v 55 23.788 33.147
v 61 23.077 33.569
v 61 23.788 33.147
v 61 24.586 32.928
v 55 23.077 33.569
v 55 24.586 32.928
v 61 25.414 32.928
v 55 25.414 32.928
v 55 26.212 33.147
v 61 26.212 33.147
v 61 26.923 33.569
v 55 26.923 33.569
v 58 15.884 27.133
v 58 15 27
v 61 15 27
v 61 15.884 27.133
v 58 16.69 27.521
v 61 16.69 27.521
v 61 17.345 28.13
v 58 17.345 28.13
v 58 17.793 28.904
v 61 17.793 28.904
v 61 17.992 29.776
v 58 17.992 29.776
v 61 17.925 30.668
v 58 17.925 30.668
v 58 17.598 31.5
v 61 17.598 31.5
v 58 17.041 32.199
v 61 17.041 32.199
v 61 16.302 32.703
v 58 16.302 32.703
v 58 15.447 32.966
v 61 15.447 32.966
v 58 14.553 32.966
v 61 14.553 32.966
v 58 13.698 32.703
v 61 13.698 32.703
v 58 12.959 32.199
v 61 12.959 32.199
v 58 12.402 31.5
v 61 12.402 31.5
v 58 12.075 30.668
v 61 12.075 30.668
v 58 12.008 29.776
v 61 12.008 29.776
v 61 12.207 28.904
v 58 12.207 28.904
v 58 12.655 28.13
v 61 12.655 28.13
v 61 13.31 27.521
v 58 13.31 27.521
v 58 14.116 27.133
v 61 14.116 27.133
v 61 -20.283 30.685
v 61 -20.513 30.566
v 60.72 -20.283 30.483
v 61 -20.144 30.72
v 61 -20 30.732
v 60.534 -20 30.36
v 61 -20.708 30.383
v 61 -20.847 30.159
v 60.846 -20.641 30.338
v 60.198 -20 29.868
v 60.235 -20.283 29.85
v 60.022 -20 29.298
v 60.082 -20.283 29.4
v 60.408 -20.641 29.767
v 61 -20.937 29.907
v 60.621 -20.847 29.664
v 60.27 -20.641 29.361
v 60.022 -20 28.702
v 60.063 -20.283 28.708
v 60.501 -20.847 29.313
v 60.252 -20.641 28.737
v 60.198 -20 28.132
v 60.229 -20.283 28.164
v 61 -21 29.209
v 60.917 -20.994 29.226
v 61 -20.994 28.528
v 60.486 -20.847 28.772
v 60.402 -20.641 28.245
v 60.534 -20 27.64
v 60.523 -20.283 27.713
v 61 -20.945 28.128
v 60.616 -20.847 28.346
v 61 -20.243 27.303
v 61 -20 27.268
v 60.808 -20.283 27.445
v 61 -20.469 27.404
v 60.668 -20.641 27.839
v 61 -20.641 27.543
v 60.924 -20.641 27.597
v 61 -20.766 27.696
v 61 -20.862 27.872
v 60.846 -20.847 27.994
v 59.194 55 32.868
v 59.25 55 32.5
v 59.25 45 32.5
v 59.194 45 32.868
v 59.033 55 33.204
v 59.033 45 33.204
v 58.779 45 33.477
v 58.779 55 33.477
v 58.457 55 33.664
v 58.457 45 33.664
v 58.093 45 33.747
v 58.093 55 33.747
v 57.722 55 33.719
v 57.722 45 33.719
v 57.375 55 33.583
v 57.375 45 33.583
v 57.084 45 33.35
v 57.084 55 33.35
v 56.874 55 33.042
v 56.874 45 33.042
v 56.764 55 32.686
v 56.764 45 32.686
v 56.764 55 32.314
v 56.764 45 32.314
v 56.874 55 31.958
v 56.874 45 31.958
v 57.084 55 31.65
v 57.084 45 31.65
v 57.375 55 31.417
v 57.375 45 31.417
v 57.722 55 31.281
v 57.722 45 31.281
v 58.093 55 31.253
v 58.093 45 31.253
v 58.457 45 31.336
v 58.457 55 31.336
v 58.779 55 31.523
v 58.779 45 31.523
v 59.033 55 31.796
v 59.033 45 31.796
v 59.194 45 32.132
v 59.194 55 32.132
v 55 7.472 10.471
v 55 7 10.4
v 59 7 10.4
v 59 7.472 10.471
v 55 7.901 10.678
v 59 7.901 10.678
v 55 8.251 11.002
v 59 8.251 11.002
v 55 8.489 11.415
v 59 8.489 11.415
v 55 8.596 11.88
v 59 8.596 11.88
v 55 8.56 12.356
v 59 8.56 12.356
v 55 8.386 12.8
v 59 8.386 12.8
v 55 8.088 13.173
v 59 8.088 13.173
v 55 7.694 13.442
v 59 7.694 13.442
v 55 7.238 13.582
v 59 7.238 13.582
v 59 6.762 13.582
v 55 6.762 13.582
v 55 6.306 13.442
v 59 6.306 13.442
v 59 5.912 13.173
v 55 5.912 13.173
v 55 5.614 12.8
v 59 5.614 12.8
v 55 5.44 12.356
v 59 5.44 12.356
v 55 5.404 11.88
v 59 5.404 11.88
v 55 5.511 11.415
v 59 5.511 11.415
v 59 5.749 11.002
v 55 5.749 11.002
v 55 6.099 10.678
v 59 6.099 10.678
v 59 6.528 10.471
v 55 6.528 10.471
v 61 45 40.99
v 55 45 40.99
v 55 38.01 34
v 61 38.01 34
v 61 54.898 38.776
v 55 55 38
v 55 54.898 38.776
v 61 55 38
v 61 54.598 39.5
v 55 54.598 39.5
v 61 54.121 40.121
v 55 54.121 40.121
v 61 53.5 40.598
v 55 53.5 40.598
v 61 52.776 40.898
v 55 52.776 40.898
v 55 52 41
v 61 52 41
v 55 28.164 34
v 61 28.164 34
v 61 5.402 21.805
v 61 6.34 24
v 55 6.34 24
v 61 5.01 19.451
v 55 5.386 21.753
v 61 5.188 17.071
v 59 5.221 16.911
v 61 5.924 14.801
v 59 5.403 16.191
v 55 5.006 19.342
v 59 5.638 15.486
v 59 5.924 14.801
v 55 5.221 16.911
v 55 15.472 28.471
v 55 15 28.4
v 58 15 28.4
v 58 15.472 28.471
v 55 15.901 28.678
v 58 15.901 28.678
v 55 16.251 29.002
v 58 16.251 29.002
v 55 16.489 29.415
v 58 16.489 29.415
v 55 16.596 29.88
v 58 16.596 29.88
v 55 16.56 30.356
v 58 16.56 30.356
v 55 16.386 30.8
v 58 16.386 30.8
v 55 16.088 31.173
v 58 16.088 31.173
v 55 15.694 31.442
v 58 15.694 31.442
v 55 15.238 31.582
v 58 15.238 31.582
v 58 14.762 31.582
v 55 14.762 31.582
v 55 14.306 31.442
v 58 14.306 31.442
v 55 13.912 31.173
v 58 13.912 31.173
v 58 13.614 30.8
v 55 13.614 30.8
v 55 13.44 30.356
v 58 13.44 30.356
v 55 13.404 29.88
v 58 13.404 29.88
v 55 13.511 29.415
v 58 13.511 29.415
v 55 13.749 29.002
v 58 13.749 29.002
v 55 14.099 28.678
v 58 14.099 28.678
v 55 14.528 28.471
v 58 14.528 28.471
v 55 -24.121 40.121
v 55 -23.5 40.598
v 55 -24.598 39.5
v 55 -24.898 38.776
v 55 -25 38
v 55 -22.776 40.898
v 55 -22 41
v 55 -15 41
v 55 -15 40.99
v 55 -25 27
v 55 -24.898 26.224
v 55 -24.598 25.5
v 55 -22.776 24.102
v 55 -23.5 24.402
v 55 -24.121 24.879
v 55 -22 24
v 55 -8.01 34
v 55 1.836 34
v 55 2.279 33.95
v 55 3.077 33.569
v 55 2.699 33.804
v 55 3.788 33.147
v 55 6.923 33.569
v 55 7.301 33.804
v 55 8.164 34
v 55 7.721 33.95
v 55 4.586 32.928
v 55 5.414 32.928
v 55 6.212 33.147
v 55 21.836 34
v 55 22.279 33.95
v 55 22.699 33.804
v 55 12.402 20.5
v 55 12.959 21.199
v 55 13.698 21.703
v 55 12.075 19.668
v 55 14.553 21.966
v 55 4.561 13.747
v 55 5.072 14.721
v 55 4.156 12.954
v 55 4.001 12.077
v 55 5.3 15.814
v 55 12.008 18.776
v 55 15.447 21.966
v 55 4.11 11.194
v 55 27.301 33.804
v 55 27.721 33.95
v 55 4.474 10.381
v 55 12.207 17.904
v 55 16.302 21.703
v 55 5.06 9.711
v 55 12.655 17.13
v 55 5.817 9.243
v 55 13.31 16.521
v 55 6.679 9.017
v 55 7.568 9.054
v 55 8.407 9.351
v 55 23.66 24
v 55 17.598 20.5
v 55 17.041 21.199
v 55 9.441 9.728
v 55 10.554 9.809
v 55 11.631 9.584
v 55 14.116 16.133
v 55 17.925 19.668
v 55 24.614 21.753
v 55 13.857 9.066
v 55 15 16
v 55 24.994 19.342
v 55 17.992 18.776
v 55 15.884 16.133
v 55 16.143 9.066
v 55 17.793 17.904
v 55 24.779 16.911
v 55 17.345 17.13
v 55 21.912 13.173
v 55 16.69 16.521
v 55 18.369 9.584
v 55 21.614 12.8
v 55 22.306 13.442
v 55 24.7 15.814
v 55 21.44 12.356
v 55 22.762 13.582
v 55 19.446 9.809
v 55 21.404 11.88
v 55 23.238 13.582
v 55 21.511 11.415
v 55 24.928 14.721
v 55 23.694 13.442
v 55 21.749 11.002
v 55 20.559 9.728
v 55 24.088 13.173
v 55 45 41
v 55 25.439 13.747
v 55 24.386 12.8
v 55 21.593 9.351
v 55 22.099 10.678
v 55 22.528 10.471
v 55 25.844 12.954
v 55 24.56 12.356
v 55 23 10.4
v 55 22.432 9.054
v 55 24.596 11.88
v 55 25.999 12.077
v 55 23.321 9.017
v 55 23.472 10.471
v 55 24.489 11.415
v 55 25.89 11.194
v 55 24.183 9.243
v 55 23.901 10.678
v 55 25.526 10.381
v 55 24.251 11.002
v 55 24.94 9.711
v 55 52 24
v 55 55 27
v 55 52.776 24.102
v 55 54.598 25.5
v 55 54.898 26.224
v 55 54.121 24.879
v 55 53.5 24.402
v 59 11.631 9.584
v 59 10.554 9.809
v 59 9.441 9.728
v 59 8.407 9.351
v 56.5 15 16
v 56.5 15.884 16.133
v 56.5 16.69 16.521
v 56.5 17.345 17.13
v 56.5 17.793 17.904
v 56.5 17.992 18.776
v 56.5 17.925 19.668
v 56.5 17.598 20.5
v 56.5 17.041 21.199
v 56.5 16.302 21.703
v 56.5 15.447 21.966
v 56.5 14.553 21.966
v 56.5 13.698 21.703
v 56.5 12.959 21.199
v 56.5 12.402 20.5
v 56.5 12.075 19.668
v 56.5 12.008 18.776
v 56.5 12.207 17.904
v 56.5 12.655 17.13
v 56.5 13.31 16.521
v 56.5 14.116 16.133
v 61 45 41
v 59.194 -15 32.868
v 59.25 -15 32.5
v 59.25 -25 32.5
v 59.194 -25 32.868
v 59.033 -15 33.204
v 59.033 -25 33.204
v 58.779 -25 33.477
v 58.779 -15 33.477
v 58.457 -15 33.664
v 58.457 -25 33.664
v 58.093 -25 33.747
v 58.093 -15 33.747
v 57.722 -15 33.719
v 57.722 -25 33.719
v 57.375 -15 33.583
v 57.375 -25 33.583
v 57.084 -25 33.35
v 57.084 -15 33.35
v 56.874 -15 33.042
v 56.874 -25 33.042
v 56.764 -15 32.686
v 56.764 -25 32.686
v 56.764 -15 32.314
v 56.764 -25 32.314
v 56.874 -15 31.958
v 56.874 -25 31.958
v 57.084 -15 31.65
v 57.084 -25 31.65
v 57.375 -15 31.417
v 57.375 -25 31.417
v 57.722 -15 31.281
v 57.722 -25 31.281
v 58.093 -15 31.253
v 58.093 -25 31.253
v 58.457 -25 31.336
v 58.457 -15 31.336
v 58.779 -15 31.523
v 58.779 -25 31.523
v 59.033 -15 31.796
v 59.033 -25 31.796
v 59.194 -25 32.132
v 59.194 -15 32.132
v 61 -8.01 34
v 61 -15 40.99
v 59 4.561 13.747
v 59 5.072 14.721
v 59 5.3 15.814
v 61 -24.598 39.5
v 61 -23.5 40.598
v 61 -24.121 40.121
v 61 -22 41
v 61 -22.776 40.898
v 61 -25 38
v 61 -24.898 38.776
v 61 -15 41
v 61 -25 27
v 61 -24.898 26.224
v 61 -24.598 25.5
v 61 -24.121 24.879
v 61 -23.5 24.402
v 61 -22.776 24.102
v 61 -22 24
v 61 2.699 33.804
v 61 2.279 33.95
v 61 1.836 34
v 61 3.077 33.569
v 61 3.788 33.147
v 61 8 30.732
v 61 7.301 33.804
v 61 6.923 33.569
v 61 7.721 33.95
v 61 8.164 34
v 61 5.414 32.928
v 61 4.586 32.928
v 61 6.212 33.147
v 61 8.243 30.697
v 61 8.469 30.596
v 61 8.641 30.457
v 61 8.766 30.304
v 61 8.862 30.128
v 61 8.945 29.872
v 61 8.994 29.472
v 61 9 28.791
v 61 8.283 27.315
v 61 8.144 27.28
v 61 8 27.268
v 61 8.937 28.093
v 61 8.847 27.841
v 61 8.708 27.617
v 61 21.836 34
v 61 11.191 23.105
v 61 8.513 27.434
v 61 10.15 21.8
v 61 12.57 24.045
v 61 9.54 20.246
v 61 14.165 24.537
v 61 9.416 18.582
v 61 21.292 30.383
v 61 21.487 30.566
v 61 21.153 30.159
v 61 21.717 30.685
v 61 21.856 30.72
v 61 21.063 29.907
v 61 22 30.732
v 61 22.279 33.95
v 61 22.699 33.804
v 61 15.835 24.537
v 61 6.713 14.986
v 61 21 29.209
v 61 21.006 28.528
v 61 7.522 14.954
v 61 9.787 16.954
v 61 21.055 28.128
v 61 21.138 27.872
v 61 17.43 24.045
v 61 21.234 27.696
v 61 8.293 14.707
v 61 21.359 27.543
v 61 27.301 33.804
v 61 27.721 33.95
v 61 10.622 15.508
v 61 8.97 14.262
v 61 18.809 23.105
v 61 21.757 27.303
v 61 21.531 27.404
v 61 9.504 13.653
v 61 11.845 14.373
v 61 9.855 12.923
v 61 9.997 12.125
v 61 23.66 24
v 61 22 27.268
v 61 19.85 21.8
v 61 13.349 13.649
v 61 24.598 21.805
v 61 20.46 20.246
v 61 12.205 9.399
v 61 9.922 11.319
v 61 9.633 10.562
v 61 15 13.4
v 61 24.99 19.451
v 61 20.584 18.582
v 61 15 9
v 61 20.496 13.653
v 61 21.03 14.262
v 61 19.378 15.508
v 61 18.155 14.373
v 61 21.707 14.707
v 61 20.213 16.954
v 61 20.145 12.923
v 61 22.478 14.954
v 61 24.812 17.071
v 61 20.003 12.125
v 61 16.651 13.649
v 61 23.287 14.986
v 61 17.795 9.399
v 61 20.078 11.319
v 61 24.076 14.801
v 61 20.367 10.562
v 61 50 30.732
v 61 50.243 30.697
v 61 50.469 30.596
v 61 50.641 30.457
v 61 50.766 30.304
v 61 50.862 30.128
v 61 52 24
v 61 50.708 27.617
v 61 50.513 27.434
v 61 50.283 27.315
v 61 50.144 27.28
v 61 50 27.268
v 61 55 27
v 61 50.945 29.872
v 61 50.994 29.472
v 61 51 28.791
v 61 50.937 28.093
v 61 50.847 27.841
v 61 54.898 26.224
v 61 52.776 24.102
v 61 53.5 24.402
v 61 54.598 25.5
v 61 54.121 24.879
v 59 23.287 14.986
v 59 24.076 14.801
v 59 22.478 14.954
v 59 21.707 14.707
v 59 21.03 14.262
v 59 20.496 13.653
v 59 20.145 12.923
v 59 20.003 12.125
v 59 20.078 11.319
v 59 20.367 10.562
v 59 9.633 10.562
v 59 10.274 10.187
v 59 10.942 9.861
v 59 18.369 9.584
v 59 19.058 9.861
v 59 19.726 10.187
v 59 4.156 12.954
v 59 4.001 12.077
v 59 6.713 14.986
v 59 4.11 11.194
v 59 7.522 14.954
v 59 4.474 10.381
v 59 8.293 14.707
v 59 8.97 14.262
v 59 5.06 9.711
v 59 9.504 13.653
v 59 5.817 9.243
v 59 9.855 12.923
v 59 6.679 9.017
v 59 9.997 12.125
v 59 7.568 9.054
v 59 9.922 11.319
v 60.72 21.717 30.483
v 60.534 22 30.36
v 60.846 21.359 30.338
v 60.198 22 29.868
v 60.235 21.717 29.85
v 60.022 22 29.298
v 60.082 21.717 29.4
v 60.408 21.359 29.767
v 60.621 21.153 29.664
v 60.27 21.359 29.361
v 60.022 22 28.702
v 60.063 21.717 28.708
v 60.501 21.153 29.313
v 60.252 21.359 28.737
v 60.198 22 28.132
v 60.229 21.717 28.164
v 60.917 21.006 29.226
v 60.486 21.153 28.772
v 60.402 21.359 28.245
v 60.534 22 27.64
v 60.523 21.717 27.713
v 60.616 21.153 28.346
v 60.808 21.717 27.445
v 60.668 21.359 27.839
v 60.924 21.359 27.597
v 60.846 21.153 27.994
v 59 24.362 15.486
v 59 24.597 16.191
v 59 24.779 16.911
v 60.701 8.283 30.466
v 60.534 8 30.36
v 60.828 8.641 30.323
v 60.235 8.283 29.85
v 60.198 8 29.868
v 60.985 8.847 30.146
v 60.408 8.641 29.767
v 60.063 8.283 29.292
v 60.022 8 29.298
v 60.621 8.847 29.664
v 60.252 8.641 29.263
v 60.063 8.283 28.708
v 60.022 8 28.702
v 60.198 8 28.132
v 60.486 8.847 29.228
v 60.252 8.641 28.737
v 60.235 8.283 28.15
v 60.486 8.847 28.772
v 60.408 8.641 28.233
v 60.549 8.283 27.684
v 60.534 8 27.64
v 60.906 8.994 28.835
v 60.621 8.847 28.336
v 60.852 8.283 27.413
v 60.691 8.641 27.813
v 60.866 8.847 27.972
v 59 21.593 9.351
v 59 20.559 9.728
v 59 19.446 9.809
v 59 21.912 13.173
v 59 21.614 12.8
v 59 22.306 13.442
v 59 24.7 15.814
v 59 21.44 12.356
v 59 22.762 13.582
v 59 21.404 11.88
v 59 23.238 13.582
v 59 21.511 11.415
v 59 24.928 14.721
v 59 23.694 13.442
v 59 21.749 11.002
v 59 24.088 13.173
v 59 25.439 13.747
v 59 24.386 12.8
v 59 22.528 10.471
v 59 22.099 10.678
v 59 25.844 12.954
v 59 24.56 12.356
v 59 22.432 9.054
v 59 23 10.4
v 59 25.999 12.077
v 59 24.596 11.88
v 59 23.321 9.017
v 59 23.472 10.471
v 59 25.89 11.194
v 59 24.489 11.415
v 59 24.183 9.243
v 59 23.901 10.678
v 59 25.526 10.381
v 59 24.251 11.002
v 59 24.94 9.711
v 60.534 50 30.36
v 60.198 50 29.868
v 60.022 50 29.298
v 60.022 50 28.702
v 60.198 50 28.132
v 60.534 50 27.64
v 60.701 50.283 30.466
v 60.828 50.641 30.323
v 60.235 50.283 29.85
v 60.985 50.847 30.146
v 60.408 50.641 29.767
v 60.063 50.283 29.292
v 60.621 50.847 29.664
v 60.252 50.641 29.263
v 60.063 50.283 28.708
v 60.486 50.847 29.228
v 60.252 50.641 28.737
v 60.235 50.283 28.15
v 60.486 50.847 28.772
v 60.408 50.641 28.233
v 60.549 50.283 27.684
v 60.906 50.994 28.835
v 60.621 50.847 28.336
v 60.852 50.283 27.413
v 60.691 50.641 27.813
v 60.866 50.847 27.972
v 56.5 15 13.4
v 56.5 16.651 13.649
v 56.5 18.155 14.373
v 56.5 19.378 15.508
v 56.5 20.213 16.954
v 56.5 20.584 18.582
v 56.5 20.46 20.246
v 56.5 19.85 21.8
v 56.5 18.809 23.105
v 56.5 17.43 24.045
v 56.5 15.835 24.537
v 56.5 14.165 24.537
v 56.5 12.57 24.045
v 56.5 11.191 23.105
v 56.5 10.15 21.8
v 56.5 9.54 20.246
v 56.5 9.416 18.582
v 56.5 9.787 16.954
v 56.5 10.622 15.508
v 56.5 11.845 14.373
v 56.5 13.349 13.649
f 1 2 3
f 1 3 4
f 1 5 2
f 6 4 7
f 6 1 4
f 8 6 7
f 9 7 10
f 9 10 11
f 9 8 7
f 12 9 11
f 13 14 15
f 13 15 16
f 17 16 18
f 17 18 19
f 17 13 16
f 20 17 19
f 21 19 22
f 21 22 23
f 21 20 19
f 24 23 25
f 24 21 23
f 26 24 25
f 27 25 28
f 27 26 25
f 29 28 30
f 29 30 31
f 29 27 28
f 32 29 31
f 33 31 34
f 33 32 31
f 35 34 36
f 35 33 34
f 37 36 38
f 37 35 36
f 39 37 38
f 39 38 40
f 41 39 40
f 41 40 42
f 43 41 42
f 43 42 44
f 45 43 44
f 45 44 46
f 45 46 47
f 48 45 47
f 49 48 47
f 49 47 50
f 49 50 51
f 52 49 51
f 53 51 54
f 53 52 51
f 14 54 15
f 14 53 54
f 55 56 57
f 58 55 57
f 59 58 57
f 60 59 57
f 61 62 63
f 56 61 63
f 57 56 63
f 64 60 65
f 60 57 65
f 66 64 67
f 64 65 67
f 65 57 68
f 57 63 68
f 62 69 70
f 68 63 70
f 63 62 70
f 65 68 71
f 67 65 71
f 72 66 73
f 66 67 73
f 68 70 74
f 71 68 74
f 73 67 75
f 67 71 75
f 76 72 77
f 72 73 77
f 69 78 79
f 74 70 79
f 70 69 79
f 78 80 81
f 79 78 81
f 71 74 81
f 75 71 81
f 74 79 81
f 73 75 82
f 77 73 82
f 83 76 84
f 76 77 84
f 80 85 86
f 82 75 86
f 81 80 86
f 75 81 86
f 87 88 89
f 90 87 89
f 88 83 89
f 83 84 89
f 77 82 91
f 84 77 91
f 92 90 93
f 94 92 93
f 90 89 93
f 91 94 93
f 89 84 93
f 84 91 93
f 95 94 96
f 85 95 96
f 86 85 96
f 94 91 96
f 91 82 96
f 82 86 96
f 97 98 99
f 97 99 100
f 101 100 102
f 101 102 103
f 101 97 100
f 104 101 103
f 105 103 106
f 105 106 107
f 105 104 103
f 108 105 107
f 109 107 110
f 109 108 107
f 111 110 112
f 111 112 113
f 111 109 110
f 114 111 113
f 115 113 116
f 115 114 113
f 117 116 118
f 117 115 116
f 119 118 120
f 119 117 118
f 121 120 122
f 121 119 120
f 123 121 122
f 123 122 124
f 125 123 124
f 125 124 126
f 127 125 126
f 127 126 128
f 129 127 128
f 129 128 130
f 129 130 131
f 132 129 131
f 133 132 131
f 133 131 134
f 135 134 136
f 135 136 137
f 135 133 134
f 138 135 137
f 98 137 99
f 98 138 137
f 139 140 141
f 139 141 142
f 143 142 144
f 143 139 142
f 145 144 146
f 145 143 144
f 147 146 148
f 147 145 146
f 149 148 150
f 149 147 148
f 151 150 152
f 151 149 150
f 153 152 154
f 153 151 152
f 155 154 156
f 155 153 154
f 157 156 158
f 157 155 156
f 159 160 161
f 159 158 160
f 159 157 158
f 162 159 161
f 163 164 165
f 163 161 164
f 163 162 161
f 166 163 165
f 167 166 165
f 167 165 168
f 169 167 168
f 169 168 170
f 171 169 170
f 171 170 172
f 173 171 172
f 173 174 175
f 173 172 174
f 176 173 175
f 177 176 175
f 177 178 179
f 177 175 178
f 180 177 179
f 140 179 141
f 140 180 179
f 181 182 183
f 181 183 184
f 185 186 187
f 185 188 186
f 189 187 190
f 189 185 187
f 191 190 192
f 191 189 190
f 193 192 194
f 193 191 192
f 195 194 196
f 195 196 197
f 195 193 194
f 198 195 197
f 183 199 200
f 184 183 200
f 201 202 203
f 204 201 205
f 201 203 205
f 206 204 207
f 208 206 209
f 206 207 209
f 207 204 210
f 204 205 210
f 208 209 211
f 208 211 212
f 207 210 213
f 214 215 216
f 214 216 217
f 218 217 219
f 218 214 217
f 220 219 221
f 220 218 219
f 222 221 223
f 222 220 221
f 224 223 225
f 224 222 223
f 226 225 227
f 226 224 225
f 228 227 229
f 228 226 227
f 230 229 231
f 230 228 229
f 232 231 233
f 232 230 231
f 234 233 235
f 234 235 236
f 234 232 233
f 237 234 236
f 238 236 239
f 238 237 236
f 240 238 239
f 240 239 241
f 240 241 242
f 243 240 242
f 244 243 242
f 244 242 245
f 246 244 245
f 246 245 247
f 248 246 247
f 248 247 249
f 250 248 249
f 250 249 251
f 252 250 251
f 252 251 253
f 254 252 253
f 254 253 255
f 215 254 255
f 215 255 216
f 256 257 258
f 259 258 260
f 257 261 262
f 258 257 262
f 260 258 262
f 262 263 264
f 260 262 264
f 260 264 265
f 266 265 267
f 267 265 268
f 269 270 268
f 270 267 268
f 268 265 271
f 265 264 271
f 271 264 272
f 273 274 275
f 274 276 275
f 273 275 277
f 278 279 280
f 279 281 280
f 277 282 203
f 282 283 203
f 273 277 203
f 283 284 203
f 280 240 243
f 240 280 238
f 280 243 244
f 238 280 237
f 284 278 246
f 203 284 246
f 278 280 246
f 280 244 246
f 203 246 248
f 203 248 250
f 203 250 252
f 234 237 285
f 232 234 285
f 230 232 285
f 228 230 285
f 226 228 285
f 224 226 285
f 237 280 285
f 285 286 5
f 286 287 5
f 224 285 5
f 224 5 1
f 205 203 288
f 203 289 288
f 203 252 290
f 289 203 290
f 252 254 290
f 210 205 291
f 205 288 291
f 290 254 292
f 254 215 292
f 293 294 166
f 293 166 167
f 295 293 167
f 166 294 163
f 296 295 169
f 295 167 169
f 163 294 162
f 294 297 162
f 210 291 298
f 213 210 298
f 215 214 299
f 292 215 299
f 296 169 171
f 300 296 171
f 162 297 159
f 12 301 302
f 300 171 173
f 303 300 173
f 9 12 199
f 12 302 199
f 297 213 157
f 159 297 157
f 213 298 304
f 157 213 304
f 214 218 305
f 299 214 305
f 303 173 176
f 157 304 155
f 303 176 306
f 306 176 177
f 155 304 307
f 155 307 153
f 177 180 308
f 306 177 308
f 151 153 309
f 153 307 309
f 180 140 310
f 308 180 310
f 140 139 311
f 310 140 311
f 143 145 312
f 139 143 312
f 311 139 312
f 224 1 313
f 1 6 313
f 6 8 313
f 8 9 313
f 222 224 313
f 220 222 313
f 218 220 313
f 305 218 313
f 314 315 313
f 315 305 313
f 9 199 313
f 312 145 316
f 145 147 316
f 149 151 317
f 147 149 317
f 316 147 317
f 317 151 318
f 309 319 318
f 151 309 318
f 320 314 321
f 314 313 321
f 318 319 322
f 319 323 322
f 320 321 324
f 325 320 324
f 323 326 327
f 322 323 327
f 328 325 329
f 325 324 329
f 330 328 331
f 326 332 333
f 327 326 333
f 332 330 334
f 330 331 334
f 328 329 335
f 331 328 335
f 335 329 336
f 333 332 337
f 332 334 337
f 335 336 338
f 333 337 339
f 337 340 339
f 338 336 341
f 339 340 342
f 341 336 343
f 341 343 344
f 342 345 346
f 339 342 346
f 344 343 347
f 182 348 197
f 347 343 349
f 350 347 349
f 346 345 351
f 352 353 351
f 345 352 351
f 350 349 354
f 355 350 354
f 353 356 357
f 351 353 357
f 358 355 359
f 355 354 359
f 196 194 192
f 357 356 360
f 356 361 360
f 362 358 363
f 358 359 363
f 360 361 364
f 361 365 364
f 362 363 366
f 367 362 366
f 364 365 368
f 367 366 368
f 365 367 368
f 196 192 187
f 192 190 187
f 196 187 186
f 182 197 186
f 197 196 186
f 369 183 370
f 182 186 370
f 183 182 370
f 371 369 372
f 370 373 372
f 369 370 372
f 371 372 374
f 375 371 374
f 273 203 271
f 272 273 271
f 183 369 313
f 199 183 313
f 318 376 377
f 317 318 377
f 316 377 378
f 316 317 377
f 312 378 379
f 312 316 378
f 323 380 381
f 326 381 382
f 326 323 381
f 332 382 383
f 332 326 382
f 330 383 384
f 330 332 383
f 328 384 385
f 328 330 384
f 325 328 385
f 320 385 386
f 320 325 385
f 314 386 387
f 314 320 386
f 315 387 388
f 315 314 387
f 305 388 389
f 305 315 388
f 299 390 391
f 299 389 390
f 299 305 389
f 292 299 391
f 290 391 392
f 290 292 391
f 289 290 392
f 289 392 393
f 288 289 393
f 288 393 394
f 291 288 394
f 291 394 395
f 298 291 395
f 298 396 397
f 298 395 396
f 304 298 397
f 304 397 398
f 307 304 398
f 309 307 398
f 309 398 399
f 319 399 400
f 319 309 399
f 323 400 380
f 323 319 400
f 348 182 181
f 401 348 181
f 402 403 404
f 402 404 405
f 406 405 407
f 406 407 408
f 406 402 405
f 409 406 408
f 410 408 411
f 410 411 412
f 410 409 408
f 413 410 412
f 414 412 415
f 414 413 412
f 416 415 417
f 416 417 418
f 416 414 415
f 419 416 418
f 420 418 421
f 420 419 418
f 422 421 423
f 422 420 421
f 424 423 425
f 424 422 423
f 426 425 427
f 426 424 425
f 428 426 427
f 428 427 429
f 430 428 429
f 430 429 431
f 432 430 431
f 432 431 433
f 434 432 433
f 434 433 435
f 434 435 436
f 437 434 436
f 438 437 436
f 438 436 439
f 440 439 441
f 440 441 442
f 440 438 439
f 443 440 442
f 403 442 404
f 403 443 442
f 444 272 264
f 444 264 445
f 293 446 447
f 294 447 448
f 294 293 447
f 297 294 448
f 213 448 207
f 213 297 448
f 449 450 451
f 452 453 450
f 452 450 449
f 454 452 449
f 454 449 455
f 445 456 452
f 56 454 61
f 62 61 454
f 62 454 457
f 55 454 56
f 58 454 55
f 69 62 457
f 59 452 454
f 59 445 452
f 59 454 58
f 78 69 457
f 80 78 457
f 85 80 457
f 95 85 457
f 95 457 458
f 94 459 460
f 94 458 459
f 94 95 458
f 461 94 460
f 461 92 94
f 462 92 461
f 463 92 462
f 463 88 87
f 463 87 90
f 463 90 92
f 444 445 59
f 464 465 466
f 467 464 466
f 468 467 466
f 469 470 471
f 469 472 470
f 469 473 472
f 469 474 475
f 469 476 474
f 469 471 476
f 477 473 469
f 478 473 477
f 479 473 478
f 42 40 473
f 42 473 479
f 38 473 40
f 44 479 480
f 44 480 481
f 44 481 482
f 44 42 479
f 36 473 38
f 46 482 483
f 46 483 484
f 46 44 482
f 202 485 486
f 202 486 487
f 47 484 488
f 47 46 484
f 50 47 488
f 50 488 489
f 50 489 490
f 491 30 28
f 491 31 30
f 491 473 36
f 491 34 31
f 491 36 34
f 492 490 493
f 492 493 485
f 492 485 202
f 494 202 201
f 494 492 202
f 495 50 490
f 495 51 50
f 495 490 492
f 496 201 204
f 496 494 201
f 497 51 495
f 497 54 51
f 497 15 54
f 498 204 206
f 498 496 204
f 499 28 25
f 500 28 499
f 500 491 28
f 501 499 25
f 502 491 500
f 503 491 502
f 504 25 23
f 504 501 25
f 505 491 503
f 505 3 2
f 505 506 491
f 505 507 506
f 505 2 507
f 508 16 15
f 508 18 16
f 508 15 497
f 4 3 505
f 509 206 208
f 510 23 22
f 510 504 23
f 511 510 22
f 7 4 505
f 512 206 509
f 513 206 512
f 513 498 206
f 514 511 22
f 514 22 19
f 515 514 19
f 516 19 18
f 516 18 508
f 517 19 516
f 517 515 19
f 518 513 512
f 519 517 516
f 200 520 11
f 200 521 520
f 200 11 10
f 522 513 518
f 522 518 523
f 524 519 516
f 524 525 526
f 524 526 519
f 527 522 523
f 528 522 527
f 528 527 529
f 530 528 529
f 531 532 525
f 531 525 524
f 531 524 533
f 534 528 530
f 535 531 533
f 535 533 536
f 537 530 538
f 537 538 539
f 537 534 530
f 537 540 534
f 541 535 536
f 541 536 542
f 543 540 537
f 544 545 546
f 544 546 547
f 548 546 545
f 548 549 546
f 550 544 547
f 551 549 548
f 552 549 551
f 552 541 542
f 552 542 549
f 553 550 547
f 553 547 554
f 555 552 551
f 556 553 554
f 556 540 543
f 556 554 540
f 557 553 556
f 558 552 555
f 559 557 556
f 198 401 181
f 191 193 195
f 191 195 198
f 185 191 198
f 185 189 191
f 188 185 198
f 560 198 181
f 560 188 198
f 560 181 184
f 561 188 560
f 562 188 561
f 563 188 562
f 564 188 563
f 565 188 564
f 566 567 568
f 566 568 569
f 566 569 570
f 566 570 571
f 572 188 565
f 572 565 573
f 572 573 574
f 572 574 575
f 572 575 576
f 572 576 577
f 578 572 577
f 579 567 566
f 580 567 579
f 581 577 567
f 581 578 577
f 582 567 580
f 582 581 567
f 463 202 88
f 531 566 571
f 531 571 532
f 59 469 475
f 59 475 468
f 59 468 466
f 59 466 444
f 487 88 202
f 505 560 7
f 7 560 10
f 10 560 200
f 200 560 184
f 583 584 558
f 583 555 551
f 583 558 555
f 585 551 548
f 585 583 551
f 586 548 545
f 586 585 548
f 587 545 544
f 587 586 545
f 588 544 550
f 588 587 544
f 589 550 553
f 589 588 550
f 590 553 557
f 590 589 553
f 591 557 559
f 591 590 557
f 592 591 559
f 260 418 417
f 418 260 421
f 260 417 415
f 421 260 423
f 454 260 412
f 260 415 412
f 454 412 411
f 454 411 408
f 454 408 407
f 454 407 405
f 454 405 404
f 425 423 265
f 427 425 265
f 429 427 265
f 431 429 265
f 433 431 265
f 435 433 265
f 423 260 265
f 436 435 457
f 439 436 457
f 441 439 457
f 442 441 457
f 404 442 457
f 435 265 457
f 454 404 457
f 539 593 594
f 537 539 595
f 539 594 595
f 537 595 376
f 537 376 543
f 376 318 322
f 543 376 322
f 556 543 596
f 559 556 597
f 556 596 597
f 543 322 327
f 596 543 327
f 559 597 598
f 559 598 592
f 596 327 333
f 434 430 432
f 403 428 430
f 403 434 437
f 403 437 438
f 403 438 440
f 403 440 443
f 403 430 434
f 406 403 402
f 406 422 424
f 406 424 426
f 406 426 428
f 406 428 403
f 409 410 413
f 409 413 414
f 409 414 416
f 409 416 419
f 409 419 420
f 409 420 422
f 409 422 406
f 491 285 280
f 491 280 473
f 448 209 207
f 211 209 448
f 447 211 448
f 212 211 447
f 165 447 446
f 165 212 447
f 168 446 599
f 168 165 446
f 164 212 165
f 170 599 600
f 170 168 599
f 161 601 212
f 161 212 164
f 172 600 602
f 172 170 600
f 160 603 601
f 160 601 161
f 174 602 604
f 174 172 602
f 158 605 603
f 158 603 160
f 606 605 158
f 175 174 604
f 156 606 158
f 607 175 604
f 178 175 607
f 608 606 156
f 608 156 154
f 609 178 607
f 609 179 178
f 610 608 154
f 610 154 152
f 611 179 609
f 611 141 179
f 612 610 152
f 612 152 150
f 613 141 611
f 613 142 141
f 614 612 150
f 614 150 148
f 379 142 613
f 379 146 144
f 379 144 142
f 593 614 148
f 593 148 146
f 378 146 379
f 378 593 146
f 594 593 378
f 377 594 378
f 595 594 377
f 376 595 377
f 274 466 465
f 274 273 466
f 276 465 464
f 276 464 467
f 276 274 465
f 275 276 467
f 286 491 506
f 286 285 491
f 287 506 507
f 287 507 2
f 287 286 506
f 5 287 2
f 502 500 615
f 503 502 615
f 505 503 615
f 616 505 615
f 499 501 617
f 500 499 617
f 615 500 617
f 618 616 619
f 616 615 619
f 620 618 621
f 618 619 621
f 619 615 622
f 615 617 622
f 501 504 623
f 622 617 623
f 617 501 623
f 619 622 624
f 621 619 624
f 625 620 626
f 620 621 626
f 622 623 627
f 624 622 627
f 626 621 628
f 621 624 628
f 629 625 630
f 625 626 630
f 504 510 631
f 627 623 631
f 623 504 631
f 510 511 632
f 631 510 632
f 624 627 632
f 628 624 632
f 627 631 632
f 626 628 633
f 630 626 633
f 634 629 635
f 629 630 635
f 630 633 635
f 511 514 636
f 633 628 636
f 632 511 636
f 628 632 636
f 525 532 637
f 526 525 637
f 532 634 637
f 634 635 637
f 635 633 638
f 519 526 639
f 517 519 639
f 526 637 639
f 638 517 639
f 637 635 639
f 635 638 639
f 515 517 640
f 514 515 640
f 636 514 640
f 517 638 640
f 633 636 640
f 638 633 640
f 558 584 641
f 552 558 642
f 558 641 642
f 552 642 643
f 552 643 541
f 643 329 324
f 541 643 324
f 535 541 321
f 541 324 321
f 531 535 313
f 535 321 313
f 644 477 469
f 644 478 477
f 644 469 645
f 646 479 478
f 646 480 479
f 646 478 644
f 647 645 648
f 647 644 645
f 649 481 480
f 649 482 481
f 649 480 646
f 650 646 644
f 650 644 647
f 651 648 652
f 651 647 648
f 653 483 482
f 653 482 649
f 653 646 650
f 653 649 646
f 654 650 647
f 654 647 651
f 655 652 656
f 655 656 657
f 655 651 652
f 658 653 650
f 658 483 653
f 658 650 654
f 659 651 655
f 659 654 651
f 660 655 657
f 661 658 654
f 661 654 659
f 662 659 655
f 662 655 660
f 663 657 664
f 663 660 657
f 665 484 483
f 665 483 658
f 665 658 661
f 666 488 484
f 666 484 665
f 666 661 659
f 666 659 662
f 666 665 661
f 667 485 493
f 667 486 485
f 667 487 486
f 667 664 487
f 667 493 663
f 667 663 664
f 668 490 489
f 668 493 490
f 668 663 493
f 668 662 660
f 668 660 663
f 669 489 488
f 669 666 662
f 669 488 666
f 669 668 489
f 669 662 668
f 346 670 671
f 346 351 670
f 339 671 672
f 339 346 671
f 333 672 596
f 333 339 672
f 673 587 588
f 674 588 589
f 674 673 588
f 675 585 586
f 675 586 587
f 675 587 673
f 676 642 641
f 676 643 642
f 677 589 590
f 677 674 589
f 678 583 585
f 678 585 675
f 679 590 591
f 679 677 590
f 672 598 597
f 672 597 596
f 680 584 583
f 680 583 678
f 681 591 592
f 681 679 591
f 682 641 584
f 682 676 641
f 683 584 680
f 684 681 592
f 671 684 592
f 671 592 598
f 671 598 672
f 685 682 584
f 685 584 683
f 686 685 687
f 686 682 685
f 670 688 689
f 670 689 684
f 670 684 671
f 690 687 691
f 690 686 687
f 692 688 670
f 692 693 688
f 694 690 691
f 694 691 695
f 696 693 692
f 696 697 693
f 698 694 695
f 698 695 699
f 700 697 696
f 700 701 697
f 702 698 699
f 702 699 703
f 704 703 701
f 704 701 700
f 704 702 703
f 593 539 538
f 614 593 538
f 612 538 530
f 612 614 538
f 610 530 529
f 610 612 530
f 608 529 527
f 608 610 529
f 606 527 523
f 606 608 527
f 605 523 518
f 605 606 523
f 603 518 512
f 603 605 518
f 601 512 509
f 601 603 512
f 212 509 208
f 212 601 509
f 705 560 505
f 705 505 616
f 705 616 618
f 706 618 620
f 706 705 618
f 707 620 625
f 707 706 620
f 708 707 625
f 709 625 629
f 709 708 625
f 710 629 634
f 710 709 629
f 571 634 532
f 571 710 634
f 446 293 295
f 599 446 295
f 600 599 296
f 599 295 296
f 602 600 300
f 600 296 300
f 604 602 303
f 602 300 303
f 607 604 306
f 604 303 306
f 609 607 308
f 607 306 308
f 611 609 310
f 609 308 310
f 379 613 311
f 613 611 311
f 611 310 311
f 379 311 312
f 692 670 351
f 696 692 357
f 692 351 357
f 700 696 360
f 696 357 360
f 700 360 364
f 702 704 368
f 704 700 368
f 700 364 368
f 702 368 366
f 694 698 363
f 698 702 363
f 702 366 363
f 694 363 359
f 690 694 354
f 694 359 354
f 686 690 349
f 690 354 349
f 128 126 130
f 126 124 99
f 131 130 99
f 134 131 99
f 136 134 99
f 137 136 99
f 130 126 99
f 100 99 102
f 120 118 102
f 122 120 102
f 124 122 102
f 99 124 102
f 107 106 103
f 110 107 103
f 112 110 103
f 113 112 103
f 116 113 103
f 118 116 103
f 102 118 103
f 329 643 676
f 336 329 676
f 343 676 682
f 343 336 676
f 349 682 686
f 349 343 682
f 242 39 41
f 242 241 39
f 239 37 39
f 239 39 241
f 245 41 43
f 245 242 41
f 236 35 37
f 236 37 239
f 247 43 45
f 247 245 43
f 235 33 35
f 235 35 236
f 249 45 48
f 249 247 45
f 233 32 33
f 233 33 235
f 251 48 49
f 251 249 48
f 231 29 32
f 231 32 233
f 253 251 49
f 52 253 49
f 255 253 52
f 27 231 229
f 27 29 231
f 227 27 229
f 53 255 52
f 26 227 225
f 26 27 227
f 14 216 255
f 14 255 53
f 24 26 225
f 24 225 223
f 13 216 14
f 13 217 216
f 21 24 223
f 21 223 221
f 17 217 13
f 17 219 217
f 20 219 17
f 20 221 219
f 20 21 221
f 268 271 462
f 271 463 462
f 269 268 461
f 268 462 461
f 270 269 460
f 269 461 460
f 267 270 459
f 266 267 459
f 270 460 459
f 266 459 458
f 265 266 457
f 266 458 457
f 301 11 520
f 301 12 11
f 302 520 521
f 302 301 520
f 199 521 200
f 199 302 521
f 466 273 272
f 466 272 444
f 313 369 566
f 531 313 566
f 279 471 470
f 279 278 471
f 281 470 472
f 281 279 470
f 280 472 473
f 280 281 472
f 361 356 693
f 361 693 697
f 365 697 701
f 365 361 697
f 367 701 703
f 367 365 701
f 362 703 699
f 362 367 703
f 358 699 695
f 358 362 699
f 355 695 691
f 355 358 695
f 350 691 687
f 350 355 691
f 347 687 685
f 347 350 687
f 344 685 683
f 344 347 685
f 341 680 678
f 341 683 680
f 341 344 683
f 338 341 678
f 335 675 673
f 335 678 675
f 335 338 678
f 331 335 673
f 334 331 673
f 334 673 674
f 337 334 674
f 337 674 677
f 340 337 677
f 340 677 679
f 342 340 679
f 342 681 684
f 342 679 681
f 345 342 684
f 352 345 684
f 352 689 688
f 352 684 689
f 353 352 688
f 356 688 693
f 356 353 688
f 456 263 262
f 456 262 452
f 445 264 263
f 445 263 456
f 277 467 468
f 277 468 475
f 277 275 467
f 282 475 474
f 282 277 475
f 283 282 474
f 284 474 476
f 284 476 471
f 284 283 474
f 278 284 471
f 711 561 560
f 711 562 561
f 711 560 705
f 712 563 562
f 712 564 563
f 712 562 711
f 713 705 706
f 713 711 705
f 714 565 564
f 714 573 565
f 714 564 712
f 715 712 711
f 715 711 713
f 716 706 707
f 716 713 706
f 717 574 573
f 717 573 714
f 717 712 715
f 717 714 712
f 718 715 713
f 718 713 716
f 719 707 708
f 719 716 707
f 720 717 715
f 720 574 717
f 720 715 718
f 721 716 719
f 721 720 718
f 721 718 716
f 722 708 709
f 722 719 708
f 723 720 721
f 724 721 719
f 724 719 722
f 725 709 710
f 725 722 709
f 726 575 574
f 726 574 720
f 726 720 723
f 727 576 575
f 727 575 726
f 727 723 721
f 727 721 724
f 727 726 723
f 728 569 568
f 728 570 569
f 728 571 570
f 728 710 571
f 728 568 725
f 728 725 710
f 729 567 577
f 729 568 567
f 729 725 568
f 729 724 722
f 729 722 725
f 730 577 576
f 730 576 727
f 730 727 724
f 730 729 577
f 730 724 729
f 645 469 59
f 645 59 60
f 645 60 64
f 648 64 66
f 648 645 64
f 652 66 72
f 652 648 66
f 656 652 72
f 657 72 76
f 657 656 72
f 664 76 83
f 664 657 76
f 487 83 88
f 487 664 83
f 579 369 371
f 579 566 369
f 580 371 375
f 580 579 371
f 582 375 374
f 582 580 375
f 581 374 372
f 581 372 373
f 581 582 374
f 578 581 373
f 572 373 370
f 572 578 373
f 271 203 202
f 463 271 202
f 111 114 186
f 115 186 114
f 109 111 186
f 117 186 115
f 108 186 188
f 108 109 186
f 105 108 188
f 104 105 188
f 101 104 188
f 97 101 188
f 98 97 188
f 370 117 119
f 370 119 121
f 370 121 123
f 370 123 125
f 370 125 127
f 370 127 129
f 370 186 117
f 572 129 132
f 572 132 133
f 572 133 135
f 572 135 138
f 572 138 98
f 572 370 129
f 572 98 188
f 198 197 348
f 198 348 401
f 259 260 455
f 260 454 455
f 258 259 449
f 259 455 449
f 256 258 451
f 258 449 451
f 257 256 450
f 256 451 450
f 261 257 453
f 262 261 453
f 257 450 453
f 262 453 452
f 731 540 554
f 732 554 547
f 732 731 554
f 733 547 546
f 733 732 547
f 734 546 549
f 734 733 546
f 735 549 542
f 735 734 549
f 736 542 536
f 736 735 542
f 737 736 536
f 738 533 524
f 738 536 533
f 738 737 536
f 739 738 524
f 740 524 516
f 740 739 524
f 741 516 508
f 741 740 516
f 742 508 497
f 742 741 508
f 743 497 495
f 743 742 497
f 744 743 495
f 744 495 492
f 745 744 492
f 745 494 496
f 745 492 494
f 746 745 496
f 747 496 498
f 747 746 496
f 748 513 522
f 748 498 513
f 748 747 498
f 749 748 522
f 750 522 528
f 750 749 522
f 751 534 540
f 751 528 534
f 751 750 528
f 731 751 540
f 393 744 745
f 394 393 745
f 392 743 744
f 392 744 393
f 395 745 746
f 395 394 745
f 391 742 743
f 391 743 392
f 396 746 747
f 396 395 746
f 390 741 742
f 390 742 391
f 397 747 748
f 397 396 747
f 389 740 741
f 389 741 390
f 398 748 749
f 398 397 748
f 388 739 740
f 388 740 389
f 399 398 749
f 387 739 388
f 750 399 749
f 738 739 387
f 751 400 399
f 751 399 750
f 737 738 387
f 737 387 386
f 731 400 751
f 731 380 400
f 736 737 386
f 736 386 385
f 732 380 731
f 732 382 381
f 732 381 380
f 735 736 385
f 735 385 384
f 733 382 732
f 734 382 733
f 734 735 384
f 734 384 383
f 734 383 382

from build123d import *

# Parameters (mm, degrees)
CYLINDER109_R           = 5.6
CYLINDER109_DEPTH       = 4.5
CYLINDER109_PITCH_ANGLE = 90
CYLINDER103_R           = 3.1
CYLINDER103_DEPTH       = 6
CYLINDER103_PITCH_ANGLE = 90
CYLINDER104_R           = 3.1
CYLINDER104_DEPTH       = 6
CYLINDER104_PITCH_ANGLE = 90
CYLINDER057_R           = 2
CYLINDER057_DEPTH       = 30
CYLINDER057_ROLL_ANGLE  = 90
FILLET017_R             = 1
CYLINDER056_R           = 2
CYLINDER056_DEPTH       = 30
CYLINDER056_ROLL_ANGLE  = 90
FILLET016_R             = 1
CYLINDER052_R           = 1.25
CYLINDER052_DEPTH       = 10
CYLINDER052_ROLL_ANGLE  = 90
CYLINDER054_R           = 1.25
CYLINDER054_DEPTH       = 10
CYLINDER054_ROLL_ANGLE  = 90
CYLINDER047_R           = 3
CYLINDER047_DEPTH       = 3
CYLINDER047_PITCH_ANGLE = 90
CYLINDER048_R           = 1.6
CYLINDER048_DEPTH       = 10
CYLINDER048_PITCH_ANGLE = 90
BOX011_W                = 6
BOX011_H                = 10
BOX011_DEPTH            = 17
CYLINDER049_R           = 5.6
CYLINDER049_DEPTH       = 6
CYLINDER049_PITCH_ANGLE = 90
BOX009_W                = 6
BOX009_H                = 80
BOX009_DEPTH            = 10
CYLINDER042_R           = 3
CYLINDER042_DEPTH       = 3
CYLINDER042_PITCH_ANGLE = 90
CYLINDER043_R           = 1.6
CYLINDER043_DEPTH       = 10
CYLINDER043_PITCH_ANGLE = 90
CYLINDER044_R           = 1.6
CYLINDER044_DEPTH       = 10
CYLINDER044_PITCH_ANGLE = 90
CYLINDER041_R           = 3
CYLINDER041_DEPTH       = 3
CYLINDER041_PITCH_ANGLE = 90
CYLINDER035_R           = 3
CYLINDER035_DEPTH       = 6
CYLINDER035_PITCH_ANGLE = 90
CYLINDER040_R           = 3
CYLINDER040_DEPTH       = 6
CYLINDER040_PITCH_ANGLE = 90
CYLINDER034_R           = 3
CYLINDER034_DEPTH       = 5
CYLINDER034_PITCH_ANGLE = 90
CYLINDER033_R           = 5.6
CYLINDER033_DEPTH       = 4
CYLINDER033_PITCH_ANGLE = 90
CYLINDER002_R           = 10
CYLINDER002_DEPTH       = 6
CYLINDER002_PITCH_ANGLE = 90
BOX010_W                = 6
BOX010_H                = 10
BOX010_DEPTH            = 17
FILLET014_R             = 3
CHAMFER001_SIZE         = 6.99
FILLET035_R             = 4
FILLET037_R             = 2


with BuildPart() as cylinder109:
    # Cylinder109 → Cylinder109 (new body)
    with BuildSketch(Plane.XY):
        Circle(CYLINDER109_R)
    extrude(amount=CYLINDER109_DEPTH)


with BuildPart() as cylinder109_1:
    # Cylinder109 pitch: moved
    add(cylinder109.part.rotate(Axis((0, 0, 0), (0, 1, 0)), CYLINDER109_PITCH_ANGLE))


with BuildPart() as cylinder109_2:
    # Cylinder109 placement: moved
    add(cylinder109_1.part.moved(Location((56.5, 15, 19))))


with BuildPart() as cylinder103:
    # Cylinder103 → Cylinder103 (new body)
    with BuildSketch(Plane.XY):
        Circle(CYLINDER103_R)
    extrude(amount=CYLINDER103_DEPTH)


with BuildPart() as cylinder103_1:
    # Cylinder103 pitch: moved
    add(cylinder103.part.rotate(Axis((0, 0, 0), (0, 1, 0)), CYLINDER103_PITCH_ANGLE))


with BuildPart() as cylinder103_2:
    # Cylinder103 placement: moved
    add(cylinder103_1.part.moved(Location((55, 5, 36))))


with BuildPart() as fusion054:
    # Cylinder104 → Cylinder104 (new body)
    with BuildSketch(Plane.XY):
        Circle(CYLINDER104_R)
    extrude(amount=CYLINDER104_DEPTH)


with BuildPart() as fusion054_1:
    # Cylinder104 pitch: moved
    add(fusion054.part.rotate(Axis((0, 0, 0), (0, 1, 0)), CYLINDER104_PITCH_ANGLE))


with BuildPart() as fusion054_2:
    # Cylinder104 placement: moved
    add(fusion054_1.part.moved(Location((55, 25, 36))))

    # Fusion054: union Cylinder103
    add(cylinder103_2.part)


with BuildPart() as fillet017:
    # Cylinder057 → Cylinder057 (new body)
    with BuildSketch(Plane.XY):
        Circle(CYLINDER057_R)
    extrude(amount=CYLINDER057_DEPTH)


with BuildPart() as fillet017_1:
    # Cylinder057 roll: moved
    add(fillet017.part.rotate(Axis((0, 0, 0), (1, 0, 0)), CYLINDER057_ROLL_ANGLE))


with BuildPart() as fillet017_2:
    # Cylinder057 placement: moved
    add(fillet017_1.part.moved(Location((62, 9, 29))))

    # Fillet017
    fillet017_edges = [fillet017_2.edges().sort_by_distance(p)[0] for p in [
        (60, -21, 29),
        (60, 9, 29),
    ]]
    fillet(fillet017_edges, radius=FILLET017_R)


with BuildPart() as fillet017_3:
    # Fillet017 placement: moved
    add(fillet017_2.part.moved(Location((0, 42, 0))))


with BuildPart() as fusion028:
    # Cylinder056 → Cylinder056 (new body)
    with BuildSketch(Plane.XY):
        Circle(CYLINDER056_R)
    extrude(amount=CYLINDER056_DEPTH)


with BuildPart() as fusion028_1:
    # Cylinder056 roll: moved
    add(fusion028.part.rotate(Axis((0, 0, 0), (1, 0, 0)), CYLINDER056_ROLL_ANGLE))


with BuildPart() as fusion028_2:
    # Cylinder056 placement: moved
    add(fusion028_1.part.moved(Location((62, 9, 29))))

    # Fillet016
    fillet016_edges = [fusion028_2.edges().sort_by_distance(p)[0] for p in [
        (60, -21, 29),
        (60, 9, 29),
    ]]
    fillet(fillet016_edges, radius=FILLET016_R)

    # Fusion028: union Fillet017
    add(fillet017_3.part)


with BuildPart() as cylinder052:
    # Cylinder052 → Cylinder052 (new body)
    with BuildSketch(Plane.XY):
        Circle(CYLINDER052_R)
    extrude(amount=CYLINDER052_DEPTH)


with BuildPart() as cylinder052_1:
    # Cylinder052 roll: moved
    add(cylinder052.part.rotate(Axis((0, 0, 0), (1, 0, 0)), CYLINDER052_ROLL_ANGLE))


with BuildPart() as cylinder052_2:
    # Cylinder052 placement: moved
    add(cylinder052_1.part.moved(Location((58, -15, 32.5))))


with BuildPart() as fusion027:
    # Cylinder054 → Cylinder054 (new body)
    with BuildSketch(Plane.XY):
        Circle(CYLINDER054_R)
    extrude(amount=CYLINDER054_DEPTH)


with BuildPart() as fusion027_1:
    # Cylinder054 roll: moved
    add(fusion027.part.rotate(Axis((0, 0, 0), (1, 0, 0)), CYLINDER054_ROLL_ANGLE))


with BuildPart() as fusion027_2:
    # Cylinder054 placement: moved
    add(fusion027_1.part.moved(Location((58, 55, 32.5))))

    # Fusion027: union Cylinder052
    add(cylinder052_2.part)


with BuildPart() as cylinder047:
    # Cylinder047 → Cylinder047 (new body)
    with BuildSketch(Plane.XY):
        Circle(CYLINDER047_R)
    extrude(amount=CYLINDER047_DEPTH)


with BuildPart() as cylinder047_1:
    # Cylinder047 pitch: moved
    add(cylinder047.part.rotate(Axis((0, 0, 0), (0, 1, 0)), CYLINDER047_PITCH_ANGLE))


with BuildPart() as cylinder047_2:
    # Cylinder047 placement: moved
    add(cylinder047_1.part.moved(Location((58, 22, 12))))


with BuildPart() as fusion024:
    # Cylinder048 → Cylinder048 (new body)
    with BuildSketch(Plane.XY):
        Circle(CYLINDER048_R)
    extrude(amount=CYLINDER048_DEPTH)


with BuildPart() as fusion024_1:
    # Cylinder048 pitch: moved
    add(fusion024.part.rotate(Axis((0, 0, 0), (0, 1, 0)), CYLINDER048_PITCH_ANGLE))


with BuildPart() as fusion024_2:
    # Cylinder048 placement: moved
    add(fusion024_1.part.moved(Location((48, 22, 12))))

    # Fusion024: union Cylinder047
    add(cylinder047_2.part)


with BuildPart() as fusion024_3:
    # Fusion024 placement: moved
    add(fusion024_2.part.moved(Location((0, -7, 18))))


with BuildPart() as cube004:
    # Box011 → Box011 (new body)
    with BuildSketch(Plane(origin=(55, 45, 24), x_dir=(1, 0, 0), z_dir=(0, 0, 1))):
        with Locations((3, 5)):
            Rectangle(BOX011_W, BOX011_H)
    extrude(amount=BOX011_DEPTH)


with BuildPart() as cylinder049:
    # Cylinder049 → Cylinder049 (new body)
    with BuildSketch(Plane.XY):
        Circle(CYLINDER049_R)
    extrude(amount=CYLINDER049_DEPTH)


with BuildPart() as cylinder049_1:
    # Cylinder049 pitch: moved
    add(cylinder049.part.rotate(Axis((0, 0, 0), (0, 1, 0)), CYLINDER049_PITCH_ANGLE))


with BuildPart() as cylinder049_2:
    # Cylinder049 placement: moved
    add(cylinder049_1.part.moved(Location((55, 15, 19))))


with BuildPart() as cut016:
    # Box009 → Box009 (new body)
    with BuildSketch(Plane(origin=(55, -25, 24), x_dir=(1, 0, 0), z_dir=(0, 0, 1))):
        with Locations((3, 40)):
            Rectangle(BOX009_W, BOX009_H)
    extrude(amount=BOX009_DEPTH)

    # Cut016: cut Cylinder049
    add(cylinder049_2.part, mode=Mode.SUBTRACT)


with BuildPart() as cylinder042:
    # Cylinder042 → Cylinder042 (new body)
    with BuildSketch(Plane.XY):
        Circle(CYLINDER042_R)
    extrude(amount=CYLINDER042_DEPTH)


with BuildPart() as cylinder042_1:
    # Cylinder042 pitch: moved
    add(cylinder042.part.rotate(Axis((0, 0, 0), (0, 1, 0)), CYLINDER042_PITCH_ANGLE))


with BuildPart() as cylinder042_2:
    # Cylinder042 placement: moved
    add(cylinder042_1.part.moved(Location((58, 7, 12))))


with BuildPart() as cylinder043:
    # Cylinder043 → Cylinder043 (new body)
    with BuildSketch(Plane.XY):
        Circle(CYLINDER043_R)
    extrude(amount=CYLINDER043_DEPTH)


with BuildPart() as cylinder043_1:
    # Cylinder043 pitch: moved
    add(cylinder043.part.rotate(Axis((0, 0, 0), (0, 1, 0)), CYLINDER043_PITCH_ANGLE))


with BuildPart() as cylinder043_2:
    # Cylinder043 placement: moved
    add(cylinder043_1.part.moved(Location((51, 7, 12))))


with BuildPart() as cylinder044:
    # Cylinder044 → Cylinder044 (new body)
    with BuildSketch(Plane.XY):
        Circle(CYLINDER044_R)
    extrude(amount=CYLINDER044_DEPTH)


with BuildPart() as cylinder044_1:
    # Cylinder044 pitch: moved
    add(cylinder044.part.rotate(Axis((0, 0, 0), (0, 1, 0)), CYLINDER044_PITCH_ANGLE))


with BuildPart() as cylinder044_2:
    # Cylinder044 placement: moved
    add(cylinder044_1.part.moved(Location((51, 23, 12))))


with BuildPart() as fusion022:
    # Cylinder041 → Cylinder041 (new body)
    with BuildSketch(Plane.XY):
        Circle(CYLINDER041_R)
    extrude(amount=CYLINDER041_DEPTH)


with BuildPart() as fusion022_1:
    # Cylinder041 pitch: moved
    add(fusion022.part.rotate(Axis((0, 0, 0), (0, 1, 0)), CYLINDER041_PITCH_ANGLE))


with BuildPart() as fusion022_2:
    # Cylinder041 placement: moved
    add(fusion022_1.part.moved(Location((58, 23, 12))))

    # Fusion022: union Cylinder042, Cylinder043, Cylinder044
    add(cylinder042_2.part)
    add(cylinder043_2.part)
    add(cylinder044_2.part)


with BuildPart() as fusion022_3:
    # Fusion022 placement: moved
    add(fusion022_2.part.moved(Location((1, 0, 0))))


with BuildPart() as cylinder035:
    # Cylinder035 → Cylinder035 (new body)
    with BuildSketch(Plane.XY):
        Circle(CYLINDER035_R)
    extrude(amount=CYLINDER035_DEPTH)


with BuildPart() as cylinder035_1:
    # Cylinder035 pitch: moved
    add(cylinder035.part.rotate(Axis((0, 0, 0), (0, 1, 0)), CYLINDER035_PITCH_ANGLE))


with BuildPart() as cylinder035_2:
    # Cylinder035 placement: moved
    add(cylinder035_1.part.moved(Location((55, 23, 12))))


with BuildPart() as cylinder040:
    # Cylinder040 → Cylinder040 (new body)
    with BuildSketch(Plane.XY):
        Circle(CYLINDER040_R)
    extrude(amount=CYLINDER040_DEPTH)


with BuildPart() as cylinder040_1:
    # Cylinder040 pitch: moved
    add(cylinder040.part.rotate(Axis((0, 0, 0), (0, 1, 0)), CYLINDER040_PITCH_ANGLE))


with BuildPart() as cylinder040_2:
    # Cylinder040 placement: moved
    add(cylinder040_1.part.moved(Location((55, 7, 12))))


with BuildPart() as cylinder034:
    # Cylinder034 → Cylinder034 (new body)
    with BuildSketch(Plane.XY):
        Circle(CYLINDER034_R)
    extrude(amount=CYLINDER034_DEPTH)


with BuildPart() as cylinder034_1:
    # Cylinder034 pitch: moved
    add(cylinder034.part.rotate(Axis((0, 0, 0), (0, 1, 0)), CYLINDER034_PITCH_ANGLE))


with BuildPart() as cylinder034_2:
    # Cylinder034 placement: moved
    add(cylinder034_1.part.moved(Location((55, 15, 19))))


with BuildPart() as fusion019:
    # Cylinder033 → Cylinder033 (new body)
    with BuildSketch(Plane.XY):
        Circle(CYLINDER033_R)
    extrude(amount=CYLINDER033_DEPTH)


with BuildPart() as fusion019_1:
    # Cylinder033 pitch: moved
    add(fusion019.part.rotate(Axis((0, 0, 0), (0, 1, 0)), CYLINDER033_PITCH_ANGLE))


with BuildPart() as fusion019_2:
    # Cylinder033 placement: moved
    add(fusion019_1.part.moved(Location((57, 15, 19))))

    # Fusion019: union Cylinder034
    add(cylinder034_2.part)


with BuildPart() as cut014:
    # Cylinder002 → Cylinder002 (new body)
    with BuildSketch(Plane.XY):
        Circle(CYLINDER002_R)
    extrude(amount=CYLINDER002_DEPTH)


with BuildPart() as cut014_1:
    # Cylinder002 pitch: moved
    add(cut014.part.rotate(Axis((0, 0, 0), (0, 1, 0)), CYLINDER002_PITCH_ANGLE))


with BuildPart() as cut014_2:
    # Cylinder002 placement: moved
    add(cut014_1.part.moved(Location((55, 15, 19))))

    # Cut012: cut Fusion019
    add(fusion019_2.part, mode=Mode.SUBTRACT)

    # Fusion021: union Cylinder035, Cylinder040
    add(cylinder035_2.part)
    add(cylinder040_2.part)

    # Cut014: cut Fusion022
    add(fusion022_3.part, mode=Mode.SUBTRACT)


with BuildPart() as exit_part:
    # Box010 → Box010 (new body)
    with BuildSketch(Plane(origin=(55, -25, 24), x_dir=(1, 0, 0), z_dir=(0, 0, 1))):
        with Locations((3, 5)):
            Rectangle(BOX010_W, BOX010_H)
    extrude(amount=BOX010_DEPTH)

    # Fusion025: union Cube004, Cut016, Cut014
    add(cube004.part)
    add(cut016.part)
    add(cut014_2.part)

    # Cut017: cut Fusion024
    add(fusion024_3.part, mode=Mode.SUBTRACT)

    # Fillet014
    fillet014_edges = [exit_part.edges().sort_by_distance(p)[0] for p in [
        (58, -25, 41),
        (58, -25, 24),
        (58, 55, 41),
        (58, 55, 24),
    ]]
    fillet(fillet014_edges, radius=FILLET014_R)

    # Chamfer001
    chamfer001_edges = [exit_part.edges().sort_by_distance(p)[0] for p in [
        (58, -15, 34),
        (58, 45, 34),
    ]]
    chamfer(chamfer001_edges, length=CHAMFER001_SIZE)

    # Cut043: cut Fusion027
    add(fusion027_2.part, mode=Mode.SUBTRACT)

    # Cut044: cut Fusion028
    add(fusion028_2.part, mode=Mode.SUBTRACT)

    # Fillet035
    fillet035_edges = [exit_part.edges().sort_by_distance(p)[0] for p in [
        (57, 5.924488, 14.800585),
        (57, 9.633034, 10.562247),
        (57, 24.075512, 14.800585),
        (57, 20.366966, 10.562247),
    ]]
    fillet(fillet035_edges, radius=FILLET035_R)

    # Cut045: cut Fusion054
    add(fusion054_2.part, mode=Mode.SUBTRACT)

    # Fillet037
    fillet037_edges = [exit_part.edges().sort_by_distance(p)[0] for p in [
        (58, 2.631456, 34),
        (58, 7.368544, 34),
        (58, 22.631456, 34),
        (58, 27.368544, 34),
    ]]
    fillet(fillet037_edges, radius=FILLET037_R)

    # Cut048: cut Cylinder109
    add(cylinder109_2.part, mode=Mode.SUBTRACT)


solid = exit_part.part
